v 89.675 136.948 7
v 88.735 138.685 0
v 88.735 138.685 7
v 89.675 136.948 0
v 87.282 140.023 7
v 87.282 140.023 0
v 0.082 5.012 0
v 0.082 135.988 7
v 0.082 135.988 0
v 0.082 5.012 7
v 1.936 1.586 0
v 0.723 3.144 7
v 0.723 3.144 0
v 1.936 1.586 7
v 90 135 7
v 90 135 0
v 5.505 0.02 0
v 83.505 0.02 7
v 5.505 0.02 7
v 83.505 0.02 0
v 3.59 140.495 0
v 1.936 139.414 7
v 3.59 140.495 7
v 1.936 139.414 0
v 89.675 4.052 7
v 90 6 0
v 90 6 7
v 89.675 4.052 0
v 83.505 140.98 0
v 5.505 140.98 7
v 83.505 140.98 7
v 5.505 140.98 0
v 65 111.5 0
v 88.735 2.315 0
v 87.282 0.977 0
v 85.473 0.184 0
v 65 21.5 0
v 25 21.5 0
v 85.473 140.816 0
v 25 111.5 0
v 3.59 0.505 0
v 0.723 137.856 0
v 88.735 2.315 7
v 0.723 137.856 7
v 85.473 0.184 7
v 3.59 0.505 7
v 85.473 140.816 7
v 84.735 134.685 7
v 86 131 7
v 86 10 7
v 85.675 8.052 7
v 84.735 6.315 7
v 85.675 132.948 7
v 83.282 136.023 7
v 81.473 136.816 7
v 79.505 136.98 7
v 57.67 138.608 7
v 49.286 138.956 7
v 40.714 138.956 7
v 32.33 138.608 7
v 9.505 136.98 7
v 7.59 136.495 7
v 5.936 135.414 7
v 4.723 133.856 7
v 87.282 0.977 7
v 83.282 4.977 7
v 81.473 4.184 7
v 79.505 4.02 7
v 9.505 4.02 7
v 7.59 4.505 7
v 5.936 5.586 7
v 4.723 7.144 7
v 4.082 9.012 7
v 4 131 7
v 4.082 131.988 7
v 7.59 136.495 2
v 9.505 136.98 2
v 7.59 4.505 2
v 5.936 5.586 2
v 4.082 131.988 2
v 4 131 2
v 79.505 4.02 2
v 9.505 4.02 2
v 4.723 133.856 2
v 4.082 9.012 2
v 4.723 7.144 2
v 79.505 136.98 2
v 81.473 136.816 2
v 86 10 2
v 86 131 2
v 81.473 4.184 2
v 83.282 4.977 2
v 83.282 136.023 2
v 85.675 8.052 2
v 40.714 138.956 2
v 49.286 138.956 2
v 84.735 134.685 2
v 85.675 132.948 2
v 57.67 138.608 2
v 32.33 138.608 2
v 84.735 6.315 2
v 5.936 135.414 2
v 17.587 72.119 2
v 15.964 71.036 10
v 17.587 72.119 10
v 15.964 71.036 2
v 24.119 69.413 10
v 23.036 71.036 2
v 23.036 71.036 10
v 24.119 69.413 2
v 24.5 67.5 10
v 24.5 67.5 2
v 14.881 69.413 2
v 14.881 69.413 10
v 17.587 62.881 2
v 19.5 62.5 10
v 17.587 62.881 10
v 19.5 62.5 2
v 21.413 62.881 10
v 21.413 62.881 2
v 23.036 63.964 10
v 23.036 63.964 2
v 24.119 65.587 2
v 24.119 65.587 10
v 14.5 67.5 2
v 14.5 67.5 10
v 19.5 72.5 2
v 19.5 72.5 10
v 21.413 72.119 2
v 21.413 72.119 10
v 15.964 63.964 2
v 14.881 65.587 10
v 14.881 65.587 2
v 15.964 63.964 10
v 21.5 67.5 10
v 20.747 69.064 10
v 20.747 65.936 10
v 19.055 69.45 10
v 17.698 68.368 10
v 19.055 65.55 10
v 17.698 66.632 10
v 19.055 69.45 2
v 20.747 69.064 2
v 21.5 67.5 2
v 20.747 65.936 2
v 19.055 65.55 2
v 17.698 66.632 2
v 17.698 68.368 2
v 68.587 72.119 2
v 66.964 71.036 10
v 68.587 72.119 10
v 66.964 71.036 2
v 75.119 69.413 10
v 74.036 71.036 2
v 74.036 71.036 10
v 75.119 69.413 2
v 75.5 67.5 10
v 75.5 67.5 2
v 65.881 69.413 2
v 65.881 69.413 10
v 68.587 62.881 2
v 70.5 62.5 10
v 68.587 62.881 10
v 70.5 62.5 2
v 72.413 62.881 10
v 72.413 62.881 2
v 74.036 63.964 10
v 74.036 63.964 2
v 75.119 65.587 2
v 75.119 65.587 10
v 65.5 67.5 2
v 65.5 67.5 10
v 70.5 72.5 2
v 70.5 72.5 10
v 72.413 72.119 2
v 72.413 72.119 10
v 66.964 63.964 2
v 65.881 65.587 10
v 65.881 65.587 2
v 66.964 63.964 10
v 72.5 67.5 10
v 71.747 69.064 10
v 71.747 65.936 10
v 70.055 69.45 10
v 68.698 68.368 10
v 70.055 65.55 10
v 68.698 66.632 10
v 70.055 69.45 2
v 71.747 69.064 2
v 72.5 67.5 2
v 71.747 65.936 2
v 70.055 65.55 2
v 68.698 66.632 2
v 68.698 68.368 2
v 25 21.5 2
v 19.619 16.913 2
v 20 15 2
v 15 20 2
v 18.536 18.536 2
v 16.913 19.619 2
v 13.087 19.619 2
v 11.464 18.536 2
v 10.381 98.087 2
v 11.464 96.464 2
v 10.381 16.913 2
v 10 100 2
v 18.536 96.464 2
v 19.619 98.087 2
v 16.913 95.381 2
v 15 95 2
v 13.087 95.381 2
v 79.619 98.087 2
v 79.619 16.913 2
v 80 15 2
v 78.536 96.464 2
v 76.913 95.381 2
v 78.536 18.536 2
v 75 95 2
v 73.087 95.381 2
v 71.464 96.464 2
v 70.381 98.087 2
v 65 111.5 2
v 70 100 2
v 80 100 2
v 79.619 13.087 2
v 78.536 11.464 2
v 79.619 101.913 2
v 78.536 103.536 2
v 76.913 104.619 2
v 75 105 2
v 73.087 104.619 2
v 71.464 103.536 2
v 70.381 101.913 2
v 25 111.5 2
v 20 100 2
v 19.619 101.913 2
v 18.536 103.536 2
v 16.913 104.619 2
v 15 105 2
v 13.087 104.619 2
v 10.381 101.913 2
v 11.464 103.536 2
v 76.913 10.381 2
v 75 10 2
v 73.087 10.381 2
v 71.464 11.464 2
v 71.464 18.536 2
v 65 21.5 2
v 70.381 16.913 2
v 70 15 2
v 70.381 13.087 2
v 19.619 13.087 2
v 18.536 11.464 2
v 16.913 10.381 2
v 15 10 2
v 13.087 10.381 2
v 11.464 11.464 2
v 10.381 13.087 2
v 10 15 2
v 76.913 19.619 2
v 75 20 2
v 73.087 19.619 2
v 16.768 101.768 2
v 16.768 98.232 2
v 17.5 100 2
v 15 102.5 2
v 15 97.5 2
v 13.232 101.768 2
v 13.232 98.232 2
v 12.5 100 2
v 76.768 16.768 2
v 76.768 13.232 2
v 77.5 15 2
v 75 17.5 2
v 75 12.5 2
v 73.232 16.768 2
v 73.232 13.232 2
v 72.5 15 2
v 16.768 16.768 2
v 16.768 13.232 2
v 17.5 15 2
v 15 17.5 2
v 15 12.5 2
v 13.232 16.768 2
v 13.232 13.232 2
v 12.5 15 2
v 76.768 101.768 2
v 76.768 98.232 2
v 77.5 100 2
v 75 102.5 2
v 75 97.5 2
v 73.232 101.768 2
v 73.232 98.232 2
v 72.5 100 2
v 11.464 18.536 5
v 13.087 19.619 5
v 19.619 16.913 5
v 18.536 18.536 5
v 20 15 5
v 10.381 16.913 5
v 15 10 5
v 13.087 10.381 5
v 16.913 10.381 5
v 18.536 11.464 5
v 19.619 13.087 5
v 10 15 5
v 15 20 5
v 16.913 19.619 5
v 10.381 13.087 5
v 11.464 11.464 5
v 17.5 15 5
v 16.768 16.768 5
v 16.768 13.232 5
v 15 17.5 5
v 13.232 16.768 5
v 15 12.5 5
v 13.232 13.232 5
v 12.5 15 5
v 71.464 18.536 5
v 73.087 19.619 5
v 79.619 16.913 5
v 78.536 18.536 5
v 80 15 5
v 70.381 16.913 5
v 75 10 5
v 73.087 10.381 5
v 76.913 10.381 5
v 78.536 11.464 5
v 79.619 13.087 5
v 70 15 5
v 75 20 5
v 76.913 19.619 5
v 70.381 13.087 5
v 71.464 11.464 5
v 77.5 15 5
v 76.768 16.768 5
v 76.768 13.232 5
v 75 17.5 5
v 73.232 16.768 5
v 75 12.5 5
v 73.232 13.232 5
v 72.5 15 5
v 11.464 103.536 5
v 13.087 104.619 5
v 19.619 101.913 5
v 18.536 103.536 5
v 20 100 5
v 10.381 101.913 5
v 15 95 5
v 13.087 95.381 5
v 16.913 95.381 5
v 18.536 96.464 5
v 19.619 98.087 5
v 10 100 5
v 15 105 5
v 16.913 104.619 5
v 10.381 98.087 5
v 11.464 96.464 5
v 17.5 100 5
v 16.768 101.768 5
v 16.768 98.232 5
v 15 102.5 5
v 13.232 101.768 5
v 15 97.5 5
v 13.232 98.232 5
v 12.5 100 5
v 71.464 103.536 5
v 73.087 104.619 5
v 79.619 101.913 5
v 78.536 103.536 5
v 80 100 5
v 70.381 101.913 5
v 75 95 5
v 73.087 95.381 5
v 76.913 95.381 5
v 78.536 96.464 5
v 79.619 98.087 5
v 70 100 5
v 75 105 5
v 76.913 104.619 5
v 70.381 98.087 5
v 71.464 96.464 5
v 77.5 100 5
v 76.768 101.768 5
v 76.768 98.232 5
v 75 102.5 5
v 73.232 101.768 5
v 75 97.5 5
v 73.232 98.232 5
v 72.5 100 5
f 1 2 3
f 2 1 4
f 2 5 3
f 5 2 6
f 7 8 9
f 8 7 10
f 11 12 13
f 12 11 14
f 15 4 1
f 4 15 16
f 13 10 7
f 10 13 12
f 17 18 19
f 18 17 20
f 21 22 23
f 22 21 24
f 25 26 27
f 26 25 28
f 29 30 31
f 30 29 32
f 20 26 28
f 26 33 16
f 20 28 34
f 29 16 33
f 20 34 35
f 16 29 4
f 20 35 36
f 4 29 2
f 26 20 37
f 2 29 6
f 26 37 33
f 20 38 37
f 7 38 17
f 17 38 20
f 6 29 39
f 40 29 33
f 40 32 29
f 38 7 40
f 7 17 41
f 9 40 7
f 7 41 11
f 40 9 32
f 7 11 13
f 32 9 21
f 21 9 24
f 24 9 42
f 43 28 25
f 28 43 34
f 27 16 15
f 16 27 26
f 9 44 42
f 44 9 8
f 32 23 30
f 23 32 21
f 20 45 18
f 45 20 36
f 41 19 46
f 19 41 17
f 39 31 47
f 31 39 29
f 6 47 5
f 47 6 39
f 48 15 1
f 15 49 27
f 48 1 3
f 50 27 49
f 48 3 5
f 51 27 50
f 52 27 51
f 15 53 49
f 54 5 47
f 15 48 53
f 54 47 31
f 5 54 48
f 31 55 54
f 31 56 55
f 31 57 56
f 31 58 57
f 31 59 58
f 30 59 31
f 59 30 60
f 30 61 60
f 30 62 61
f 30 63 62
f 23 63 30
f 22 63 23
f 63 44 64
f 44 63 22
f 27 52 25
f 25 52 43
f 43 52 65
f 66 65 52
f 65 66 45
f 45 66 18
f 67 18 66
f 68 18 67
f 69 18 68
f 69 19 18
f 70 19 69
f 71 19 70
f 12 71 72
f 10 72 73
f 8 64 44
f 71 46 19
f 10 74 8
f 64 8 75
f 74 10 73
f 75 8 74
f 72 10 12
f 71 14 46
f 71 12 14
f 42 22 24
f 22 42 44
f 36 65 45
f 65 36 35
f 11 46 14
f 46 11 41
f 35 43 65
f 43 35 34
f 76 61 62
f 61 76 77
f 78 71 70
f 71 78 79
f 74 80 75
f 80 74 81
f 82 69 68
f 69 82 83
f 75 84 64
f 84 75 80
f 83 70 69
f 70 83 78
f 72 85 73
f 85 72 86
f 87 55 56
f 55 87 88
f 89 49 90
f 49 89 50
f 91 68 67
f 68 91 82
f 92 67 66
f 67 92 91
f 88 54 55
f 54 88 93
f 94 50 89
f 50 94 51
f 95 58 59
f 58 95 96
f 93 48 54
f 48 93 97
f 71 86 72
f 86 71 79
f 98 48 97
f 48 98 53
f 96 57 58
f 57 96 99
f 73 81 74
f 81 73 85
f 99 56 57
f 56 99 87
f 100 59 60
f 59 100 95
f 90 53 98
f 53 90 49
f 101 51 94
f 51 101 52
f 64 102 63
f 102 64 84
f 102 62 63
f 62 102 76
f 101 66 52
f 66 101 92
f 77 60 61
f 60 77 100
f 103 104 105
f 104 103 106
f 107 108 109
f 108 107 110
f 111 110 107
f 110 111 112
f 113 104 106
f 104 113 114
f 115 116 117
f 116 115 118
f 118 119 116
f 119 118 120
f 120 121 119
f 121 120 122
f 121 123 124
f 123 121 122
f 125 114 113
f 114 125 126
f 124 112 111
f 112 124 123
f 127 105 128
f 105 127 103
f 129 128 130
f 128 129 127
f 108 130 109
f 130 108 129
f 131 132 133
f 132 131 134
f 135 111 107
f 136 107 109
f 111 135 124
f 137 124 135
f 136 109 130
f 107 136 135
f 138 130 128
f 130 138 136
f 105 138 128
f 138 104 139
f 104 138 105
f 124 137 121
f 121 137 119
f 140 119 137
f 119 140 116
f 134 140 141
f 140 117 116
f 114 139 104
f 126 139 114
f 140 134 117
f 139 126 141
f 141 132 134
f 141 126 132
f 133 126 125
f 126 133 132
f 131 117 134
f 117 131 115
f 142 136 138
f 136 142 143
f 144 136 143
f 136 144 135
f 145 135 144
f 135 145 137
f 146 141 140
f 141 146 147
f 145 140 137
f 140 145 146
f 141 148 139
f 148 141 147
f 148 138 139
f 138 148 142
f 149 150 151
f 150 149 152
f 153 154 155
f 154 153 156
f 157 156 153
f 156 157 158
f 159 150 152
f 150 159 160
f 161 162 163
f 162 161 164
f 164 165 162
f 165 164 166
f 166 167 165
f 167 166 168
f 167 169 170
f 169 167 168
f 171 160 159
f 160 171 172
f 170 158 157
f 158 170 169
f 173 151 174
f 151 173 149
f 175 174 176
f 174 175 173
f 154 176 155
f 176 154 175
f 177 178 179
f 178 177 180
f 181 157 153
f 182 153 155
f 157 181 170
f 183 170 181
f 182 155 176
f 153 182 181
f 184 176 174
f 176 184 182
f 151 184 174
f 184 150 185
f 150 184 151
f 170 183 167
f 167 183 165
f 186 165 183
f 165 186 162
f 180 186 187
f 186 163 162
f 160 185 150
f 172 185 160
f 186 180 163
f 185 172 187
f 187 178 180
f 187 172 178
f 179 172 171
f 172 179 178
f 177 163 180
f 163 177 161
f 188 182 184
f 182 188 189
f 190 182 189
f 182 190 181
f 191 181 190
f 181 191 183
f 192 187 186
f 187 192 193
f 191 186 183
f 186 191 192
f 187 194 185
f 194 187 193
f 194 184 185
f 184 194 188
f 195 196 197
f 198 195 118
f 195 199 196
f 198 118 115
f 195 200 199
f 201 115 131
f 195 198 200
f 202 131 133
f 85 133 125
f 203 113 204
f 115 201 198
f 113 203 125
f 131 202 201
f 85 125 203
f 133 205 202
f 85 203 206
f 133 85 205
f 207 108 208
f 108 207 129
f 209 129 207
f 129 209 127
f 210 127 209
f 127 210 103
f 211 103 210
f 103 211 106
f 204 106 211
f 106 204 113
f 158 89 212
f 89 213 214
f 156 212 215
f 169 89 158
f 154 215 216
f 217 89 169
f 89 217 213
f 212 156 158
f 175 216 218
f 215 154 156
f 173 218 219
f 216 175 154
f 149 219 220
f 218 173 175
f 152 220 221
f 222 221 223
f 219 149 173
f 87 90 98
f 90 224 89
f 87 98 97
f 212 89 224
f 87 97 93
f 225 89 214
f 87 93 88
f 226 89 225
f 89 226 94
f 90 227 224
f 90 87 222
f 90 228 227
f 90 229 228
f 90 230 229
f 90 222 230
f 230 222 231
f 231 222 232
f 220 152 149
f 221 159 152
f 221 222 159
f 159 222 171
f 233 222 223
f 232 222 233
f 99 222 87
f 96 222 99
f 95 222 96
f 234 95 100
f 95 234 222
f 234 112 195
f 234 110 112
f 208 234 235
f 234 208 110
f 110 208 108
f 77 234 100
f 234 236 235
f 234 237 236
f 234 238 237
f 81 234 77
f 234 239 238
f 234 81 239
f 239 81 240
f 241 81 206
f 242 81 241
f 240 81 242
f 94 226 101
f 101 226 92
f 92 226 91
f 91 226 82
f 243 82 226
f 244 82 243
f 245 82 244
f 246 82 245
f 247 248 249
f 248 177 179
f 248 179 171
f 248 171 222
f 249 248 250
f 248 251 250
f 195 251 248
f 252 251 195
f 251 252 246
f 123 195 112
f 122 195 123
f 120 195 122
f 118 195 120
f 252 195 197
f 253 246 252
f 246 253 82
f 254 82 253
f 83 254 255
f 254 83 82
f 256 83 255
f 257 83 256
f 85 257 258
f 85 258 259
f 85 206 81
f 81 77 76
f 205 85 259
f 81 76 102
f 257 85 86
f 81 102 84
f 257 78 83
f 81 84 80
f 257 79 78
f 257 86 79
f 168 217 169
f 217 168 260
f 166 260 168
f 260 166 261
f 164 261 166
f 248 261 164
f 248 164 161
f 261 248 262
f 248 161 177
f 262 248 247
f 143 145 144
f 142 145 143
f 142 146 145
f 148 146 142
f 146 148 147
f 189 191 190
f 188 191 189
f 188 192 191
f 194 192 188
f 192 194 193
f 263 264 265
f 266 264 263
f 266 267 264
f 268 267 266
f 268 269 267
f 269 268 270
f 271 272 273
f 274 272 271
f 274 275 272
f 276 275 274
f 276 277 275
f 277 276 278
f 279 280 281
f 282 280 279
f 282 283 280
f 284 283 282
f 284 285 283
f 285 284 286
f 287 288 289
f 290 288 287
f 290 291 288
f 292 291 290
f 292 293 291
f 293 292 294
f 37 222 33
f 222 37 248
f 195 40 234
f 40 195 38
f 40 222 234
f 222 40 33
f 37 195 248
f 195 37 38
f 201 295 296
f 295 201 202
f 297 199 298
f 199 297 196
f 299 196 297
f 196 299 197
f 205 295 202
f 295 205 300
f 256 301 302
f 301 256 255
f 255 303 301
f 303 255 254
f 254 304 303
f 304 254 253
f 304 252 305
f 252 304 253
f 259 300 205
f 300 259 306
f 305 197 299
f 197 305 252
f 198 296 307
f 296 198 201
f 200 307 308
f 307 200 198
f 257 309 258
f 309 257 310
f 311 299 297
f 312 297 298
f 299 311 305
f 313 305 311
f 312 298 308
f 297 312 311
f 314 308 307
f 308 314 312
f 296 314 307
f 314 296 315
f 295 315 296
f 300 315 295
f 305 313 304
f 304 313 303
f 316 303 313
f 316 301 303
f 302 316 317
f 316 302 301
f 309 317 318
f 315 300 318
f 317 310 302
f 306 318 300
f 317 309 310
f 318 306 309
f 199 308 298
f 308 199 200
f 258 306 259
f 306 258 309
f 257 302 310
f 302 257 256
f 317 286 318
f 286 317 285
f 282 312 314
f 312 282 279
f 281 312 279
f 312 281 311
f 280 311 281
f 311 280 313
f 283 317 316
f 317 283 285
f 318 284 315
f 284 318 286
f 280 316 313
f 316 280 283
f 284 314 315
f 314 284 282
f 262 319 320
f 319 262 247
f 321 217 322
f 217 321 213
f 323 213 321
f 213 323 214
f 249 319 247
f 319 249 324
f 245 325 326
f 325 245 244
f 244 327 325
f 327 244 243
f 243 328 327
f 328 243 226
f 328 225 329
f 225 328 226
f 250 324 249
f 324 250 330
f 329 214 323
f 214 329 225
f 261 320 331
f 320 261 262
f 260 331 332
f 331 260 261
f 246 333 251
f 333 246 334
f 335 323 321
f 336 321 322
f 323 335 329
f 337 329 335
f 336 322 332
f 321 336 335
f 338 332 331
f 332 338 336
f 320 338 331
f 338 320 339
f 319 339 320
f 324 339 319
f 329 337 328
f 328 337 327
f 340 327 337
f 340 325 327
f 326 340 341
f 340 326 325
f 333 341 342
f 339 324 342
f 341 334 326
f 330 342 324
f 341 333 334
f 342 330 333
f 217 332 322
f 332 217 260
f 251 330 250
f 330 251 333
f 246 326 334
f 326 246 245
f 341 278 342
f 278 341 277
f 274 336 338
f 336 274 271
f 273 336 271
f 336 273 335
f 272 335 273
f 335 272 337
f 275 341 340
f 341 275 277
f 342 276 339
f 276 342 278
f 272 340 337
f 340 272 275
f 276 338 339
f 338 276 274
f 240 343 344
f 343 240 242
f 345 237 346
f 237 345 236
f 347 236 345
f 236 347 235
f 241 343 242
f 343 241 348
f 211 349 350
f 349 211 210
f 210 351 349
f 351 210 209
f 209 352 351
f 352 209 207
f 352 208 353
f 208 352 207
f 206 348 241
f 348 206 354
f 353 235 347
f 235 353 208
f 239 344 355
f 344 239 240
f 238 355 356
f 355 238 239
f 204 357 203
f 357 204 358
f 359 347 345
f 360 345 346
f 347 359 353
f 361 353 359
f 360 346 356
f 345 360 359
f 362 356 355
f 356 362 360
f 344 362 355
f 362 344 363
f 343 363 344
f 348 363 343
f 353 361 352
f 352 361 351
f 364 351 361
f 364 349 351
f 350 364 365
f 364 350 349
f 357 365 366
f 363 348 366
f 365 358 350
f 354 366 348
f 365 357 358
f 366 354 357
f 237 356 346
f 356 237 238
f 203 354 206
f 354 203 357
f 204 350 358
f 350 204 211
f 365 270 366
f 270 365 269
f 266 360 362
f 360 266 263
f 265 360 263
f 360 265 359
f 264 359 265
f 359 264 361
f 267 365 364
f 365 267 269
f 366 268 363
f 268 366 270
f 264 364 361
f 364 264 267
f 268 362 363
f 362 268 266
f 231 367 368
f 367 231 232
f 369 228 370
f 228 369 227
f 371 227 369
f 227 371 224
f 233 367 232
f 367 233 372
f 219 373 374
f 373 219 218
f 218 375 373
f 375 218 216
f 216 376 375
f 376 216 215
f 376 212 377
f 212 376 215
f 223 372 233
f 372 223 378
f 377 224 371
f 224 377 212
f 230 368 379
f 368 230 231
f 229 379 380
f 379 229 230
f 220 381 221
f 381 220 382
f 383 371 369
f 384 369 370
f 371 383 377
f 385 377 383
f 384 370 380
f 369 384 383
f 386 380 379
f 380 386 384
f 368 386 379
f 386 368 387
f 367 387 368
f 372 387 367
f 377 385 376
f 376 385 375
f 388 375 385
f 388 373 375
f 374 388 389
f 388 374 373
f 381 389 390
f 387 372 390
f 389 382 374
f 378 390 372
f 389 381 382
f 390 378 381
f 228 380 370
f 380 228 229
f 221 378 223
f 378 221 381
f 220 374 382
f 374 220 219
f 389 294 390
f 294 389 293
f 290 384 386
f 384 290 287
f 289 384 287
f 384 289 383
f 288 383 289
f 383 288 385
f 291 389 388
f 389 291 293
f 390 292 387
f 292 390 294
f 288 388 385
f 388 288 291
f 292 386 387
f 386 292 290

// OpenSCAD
inner_radius=6;






module plate(inner_width,inner_length,top_dome=0,height=2) {
    hull() {
        translate([inner_radius,inner_radius,0])cylinder(height,r=inner_radius);
        translate([inner_width-inner_radius,inner_radius,0]) cylinder(height,r=inner_radius);
        translate([inner_width-inner_radius,inner_length-inner_radius,0]) cylinder(height,r=inner_radius);
        translate([inner_radius,inner_length-inner_radius,0]) cylinder(height,r=inner_radius);
        if (top_dome>0) {
            translate([inner_width/2,inner_length-inner_radius,0]) scale([1,(inner_radius+top_dome)*2/inner_width,1]) cylinder(height,r=inner_width/2);
        }
    }
}

module tube(od,id,height) {
    difference() {
        cylinder(h=height,d=od);
        cylinder(h=height,d=id);
    }
}

wall=4;

width=82;
height=133;
 difference() {
    plate(width+wall*2,height+wall*2,height=7);
    translate([wall,wall,0]) plate(width,height,2,height=7);
 }

translate([19.5,67.5,0]) tube(10,4,10);
translate([(width+2*wall)-19.5,67.5,0]) tube(10,4,10);

empty_width=40;
empty_height=90;
difference() {
    translate([wall,wall,0]) plate(width,133,2,height=2);
    translate([(width+2*wall)/2-empty_width/2,(height/2)-(empty_height/2),0]) cube([empty_width,empty_height,5]);
}

translate([15,15,0]) tube(10,5,5);
translate([(width+2*wall)-15,15,0]) tube(10,5,5);

translate([15,100,0]) tube(10,5,5);
translate([(width+2*wall)-15,100,0]) tube(10,5,5);
//72-4.5
 
 
